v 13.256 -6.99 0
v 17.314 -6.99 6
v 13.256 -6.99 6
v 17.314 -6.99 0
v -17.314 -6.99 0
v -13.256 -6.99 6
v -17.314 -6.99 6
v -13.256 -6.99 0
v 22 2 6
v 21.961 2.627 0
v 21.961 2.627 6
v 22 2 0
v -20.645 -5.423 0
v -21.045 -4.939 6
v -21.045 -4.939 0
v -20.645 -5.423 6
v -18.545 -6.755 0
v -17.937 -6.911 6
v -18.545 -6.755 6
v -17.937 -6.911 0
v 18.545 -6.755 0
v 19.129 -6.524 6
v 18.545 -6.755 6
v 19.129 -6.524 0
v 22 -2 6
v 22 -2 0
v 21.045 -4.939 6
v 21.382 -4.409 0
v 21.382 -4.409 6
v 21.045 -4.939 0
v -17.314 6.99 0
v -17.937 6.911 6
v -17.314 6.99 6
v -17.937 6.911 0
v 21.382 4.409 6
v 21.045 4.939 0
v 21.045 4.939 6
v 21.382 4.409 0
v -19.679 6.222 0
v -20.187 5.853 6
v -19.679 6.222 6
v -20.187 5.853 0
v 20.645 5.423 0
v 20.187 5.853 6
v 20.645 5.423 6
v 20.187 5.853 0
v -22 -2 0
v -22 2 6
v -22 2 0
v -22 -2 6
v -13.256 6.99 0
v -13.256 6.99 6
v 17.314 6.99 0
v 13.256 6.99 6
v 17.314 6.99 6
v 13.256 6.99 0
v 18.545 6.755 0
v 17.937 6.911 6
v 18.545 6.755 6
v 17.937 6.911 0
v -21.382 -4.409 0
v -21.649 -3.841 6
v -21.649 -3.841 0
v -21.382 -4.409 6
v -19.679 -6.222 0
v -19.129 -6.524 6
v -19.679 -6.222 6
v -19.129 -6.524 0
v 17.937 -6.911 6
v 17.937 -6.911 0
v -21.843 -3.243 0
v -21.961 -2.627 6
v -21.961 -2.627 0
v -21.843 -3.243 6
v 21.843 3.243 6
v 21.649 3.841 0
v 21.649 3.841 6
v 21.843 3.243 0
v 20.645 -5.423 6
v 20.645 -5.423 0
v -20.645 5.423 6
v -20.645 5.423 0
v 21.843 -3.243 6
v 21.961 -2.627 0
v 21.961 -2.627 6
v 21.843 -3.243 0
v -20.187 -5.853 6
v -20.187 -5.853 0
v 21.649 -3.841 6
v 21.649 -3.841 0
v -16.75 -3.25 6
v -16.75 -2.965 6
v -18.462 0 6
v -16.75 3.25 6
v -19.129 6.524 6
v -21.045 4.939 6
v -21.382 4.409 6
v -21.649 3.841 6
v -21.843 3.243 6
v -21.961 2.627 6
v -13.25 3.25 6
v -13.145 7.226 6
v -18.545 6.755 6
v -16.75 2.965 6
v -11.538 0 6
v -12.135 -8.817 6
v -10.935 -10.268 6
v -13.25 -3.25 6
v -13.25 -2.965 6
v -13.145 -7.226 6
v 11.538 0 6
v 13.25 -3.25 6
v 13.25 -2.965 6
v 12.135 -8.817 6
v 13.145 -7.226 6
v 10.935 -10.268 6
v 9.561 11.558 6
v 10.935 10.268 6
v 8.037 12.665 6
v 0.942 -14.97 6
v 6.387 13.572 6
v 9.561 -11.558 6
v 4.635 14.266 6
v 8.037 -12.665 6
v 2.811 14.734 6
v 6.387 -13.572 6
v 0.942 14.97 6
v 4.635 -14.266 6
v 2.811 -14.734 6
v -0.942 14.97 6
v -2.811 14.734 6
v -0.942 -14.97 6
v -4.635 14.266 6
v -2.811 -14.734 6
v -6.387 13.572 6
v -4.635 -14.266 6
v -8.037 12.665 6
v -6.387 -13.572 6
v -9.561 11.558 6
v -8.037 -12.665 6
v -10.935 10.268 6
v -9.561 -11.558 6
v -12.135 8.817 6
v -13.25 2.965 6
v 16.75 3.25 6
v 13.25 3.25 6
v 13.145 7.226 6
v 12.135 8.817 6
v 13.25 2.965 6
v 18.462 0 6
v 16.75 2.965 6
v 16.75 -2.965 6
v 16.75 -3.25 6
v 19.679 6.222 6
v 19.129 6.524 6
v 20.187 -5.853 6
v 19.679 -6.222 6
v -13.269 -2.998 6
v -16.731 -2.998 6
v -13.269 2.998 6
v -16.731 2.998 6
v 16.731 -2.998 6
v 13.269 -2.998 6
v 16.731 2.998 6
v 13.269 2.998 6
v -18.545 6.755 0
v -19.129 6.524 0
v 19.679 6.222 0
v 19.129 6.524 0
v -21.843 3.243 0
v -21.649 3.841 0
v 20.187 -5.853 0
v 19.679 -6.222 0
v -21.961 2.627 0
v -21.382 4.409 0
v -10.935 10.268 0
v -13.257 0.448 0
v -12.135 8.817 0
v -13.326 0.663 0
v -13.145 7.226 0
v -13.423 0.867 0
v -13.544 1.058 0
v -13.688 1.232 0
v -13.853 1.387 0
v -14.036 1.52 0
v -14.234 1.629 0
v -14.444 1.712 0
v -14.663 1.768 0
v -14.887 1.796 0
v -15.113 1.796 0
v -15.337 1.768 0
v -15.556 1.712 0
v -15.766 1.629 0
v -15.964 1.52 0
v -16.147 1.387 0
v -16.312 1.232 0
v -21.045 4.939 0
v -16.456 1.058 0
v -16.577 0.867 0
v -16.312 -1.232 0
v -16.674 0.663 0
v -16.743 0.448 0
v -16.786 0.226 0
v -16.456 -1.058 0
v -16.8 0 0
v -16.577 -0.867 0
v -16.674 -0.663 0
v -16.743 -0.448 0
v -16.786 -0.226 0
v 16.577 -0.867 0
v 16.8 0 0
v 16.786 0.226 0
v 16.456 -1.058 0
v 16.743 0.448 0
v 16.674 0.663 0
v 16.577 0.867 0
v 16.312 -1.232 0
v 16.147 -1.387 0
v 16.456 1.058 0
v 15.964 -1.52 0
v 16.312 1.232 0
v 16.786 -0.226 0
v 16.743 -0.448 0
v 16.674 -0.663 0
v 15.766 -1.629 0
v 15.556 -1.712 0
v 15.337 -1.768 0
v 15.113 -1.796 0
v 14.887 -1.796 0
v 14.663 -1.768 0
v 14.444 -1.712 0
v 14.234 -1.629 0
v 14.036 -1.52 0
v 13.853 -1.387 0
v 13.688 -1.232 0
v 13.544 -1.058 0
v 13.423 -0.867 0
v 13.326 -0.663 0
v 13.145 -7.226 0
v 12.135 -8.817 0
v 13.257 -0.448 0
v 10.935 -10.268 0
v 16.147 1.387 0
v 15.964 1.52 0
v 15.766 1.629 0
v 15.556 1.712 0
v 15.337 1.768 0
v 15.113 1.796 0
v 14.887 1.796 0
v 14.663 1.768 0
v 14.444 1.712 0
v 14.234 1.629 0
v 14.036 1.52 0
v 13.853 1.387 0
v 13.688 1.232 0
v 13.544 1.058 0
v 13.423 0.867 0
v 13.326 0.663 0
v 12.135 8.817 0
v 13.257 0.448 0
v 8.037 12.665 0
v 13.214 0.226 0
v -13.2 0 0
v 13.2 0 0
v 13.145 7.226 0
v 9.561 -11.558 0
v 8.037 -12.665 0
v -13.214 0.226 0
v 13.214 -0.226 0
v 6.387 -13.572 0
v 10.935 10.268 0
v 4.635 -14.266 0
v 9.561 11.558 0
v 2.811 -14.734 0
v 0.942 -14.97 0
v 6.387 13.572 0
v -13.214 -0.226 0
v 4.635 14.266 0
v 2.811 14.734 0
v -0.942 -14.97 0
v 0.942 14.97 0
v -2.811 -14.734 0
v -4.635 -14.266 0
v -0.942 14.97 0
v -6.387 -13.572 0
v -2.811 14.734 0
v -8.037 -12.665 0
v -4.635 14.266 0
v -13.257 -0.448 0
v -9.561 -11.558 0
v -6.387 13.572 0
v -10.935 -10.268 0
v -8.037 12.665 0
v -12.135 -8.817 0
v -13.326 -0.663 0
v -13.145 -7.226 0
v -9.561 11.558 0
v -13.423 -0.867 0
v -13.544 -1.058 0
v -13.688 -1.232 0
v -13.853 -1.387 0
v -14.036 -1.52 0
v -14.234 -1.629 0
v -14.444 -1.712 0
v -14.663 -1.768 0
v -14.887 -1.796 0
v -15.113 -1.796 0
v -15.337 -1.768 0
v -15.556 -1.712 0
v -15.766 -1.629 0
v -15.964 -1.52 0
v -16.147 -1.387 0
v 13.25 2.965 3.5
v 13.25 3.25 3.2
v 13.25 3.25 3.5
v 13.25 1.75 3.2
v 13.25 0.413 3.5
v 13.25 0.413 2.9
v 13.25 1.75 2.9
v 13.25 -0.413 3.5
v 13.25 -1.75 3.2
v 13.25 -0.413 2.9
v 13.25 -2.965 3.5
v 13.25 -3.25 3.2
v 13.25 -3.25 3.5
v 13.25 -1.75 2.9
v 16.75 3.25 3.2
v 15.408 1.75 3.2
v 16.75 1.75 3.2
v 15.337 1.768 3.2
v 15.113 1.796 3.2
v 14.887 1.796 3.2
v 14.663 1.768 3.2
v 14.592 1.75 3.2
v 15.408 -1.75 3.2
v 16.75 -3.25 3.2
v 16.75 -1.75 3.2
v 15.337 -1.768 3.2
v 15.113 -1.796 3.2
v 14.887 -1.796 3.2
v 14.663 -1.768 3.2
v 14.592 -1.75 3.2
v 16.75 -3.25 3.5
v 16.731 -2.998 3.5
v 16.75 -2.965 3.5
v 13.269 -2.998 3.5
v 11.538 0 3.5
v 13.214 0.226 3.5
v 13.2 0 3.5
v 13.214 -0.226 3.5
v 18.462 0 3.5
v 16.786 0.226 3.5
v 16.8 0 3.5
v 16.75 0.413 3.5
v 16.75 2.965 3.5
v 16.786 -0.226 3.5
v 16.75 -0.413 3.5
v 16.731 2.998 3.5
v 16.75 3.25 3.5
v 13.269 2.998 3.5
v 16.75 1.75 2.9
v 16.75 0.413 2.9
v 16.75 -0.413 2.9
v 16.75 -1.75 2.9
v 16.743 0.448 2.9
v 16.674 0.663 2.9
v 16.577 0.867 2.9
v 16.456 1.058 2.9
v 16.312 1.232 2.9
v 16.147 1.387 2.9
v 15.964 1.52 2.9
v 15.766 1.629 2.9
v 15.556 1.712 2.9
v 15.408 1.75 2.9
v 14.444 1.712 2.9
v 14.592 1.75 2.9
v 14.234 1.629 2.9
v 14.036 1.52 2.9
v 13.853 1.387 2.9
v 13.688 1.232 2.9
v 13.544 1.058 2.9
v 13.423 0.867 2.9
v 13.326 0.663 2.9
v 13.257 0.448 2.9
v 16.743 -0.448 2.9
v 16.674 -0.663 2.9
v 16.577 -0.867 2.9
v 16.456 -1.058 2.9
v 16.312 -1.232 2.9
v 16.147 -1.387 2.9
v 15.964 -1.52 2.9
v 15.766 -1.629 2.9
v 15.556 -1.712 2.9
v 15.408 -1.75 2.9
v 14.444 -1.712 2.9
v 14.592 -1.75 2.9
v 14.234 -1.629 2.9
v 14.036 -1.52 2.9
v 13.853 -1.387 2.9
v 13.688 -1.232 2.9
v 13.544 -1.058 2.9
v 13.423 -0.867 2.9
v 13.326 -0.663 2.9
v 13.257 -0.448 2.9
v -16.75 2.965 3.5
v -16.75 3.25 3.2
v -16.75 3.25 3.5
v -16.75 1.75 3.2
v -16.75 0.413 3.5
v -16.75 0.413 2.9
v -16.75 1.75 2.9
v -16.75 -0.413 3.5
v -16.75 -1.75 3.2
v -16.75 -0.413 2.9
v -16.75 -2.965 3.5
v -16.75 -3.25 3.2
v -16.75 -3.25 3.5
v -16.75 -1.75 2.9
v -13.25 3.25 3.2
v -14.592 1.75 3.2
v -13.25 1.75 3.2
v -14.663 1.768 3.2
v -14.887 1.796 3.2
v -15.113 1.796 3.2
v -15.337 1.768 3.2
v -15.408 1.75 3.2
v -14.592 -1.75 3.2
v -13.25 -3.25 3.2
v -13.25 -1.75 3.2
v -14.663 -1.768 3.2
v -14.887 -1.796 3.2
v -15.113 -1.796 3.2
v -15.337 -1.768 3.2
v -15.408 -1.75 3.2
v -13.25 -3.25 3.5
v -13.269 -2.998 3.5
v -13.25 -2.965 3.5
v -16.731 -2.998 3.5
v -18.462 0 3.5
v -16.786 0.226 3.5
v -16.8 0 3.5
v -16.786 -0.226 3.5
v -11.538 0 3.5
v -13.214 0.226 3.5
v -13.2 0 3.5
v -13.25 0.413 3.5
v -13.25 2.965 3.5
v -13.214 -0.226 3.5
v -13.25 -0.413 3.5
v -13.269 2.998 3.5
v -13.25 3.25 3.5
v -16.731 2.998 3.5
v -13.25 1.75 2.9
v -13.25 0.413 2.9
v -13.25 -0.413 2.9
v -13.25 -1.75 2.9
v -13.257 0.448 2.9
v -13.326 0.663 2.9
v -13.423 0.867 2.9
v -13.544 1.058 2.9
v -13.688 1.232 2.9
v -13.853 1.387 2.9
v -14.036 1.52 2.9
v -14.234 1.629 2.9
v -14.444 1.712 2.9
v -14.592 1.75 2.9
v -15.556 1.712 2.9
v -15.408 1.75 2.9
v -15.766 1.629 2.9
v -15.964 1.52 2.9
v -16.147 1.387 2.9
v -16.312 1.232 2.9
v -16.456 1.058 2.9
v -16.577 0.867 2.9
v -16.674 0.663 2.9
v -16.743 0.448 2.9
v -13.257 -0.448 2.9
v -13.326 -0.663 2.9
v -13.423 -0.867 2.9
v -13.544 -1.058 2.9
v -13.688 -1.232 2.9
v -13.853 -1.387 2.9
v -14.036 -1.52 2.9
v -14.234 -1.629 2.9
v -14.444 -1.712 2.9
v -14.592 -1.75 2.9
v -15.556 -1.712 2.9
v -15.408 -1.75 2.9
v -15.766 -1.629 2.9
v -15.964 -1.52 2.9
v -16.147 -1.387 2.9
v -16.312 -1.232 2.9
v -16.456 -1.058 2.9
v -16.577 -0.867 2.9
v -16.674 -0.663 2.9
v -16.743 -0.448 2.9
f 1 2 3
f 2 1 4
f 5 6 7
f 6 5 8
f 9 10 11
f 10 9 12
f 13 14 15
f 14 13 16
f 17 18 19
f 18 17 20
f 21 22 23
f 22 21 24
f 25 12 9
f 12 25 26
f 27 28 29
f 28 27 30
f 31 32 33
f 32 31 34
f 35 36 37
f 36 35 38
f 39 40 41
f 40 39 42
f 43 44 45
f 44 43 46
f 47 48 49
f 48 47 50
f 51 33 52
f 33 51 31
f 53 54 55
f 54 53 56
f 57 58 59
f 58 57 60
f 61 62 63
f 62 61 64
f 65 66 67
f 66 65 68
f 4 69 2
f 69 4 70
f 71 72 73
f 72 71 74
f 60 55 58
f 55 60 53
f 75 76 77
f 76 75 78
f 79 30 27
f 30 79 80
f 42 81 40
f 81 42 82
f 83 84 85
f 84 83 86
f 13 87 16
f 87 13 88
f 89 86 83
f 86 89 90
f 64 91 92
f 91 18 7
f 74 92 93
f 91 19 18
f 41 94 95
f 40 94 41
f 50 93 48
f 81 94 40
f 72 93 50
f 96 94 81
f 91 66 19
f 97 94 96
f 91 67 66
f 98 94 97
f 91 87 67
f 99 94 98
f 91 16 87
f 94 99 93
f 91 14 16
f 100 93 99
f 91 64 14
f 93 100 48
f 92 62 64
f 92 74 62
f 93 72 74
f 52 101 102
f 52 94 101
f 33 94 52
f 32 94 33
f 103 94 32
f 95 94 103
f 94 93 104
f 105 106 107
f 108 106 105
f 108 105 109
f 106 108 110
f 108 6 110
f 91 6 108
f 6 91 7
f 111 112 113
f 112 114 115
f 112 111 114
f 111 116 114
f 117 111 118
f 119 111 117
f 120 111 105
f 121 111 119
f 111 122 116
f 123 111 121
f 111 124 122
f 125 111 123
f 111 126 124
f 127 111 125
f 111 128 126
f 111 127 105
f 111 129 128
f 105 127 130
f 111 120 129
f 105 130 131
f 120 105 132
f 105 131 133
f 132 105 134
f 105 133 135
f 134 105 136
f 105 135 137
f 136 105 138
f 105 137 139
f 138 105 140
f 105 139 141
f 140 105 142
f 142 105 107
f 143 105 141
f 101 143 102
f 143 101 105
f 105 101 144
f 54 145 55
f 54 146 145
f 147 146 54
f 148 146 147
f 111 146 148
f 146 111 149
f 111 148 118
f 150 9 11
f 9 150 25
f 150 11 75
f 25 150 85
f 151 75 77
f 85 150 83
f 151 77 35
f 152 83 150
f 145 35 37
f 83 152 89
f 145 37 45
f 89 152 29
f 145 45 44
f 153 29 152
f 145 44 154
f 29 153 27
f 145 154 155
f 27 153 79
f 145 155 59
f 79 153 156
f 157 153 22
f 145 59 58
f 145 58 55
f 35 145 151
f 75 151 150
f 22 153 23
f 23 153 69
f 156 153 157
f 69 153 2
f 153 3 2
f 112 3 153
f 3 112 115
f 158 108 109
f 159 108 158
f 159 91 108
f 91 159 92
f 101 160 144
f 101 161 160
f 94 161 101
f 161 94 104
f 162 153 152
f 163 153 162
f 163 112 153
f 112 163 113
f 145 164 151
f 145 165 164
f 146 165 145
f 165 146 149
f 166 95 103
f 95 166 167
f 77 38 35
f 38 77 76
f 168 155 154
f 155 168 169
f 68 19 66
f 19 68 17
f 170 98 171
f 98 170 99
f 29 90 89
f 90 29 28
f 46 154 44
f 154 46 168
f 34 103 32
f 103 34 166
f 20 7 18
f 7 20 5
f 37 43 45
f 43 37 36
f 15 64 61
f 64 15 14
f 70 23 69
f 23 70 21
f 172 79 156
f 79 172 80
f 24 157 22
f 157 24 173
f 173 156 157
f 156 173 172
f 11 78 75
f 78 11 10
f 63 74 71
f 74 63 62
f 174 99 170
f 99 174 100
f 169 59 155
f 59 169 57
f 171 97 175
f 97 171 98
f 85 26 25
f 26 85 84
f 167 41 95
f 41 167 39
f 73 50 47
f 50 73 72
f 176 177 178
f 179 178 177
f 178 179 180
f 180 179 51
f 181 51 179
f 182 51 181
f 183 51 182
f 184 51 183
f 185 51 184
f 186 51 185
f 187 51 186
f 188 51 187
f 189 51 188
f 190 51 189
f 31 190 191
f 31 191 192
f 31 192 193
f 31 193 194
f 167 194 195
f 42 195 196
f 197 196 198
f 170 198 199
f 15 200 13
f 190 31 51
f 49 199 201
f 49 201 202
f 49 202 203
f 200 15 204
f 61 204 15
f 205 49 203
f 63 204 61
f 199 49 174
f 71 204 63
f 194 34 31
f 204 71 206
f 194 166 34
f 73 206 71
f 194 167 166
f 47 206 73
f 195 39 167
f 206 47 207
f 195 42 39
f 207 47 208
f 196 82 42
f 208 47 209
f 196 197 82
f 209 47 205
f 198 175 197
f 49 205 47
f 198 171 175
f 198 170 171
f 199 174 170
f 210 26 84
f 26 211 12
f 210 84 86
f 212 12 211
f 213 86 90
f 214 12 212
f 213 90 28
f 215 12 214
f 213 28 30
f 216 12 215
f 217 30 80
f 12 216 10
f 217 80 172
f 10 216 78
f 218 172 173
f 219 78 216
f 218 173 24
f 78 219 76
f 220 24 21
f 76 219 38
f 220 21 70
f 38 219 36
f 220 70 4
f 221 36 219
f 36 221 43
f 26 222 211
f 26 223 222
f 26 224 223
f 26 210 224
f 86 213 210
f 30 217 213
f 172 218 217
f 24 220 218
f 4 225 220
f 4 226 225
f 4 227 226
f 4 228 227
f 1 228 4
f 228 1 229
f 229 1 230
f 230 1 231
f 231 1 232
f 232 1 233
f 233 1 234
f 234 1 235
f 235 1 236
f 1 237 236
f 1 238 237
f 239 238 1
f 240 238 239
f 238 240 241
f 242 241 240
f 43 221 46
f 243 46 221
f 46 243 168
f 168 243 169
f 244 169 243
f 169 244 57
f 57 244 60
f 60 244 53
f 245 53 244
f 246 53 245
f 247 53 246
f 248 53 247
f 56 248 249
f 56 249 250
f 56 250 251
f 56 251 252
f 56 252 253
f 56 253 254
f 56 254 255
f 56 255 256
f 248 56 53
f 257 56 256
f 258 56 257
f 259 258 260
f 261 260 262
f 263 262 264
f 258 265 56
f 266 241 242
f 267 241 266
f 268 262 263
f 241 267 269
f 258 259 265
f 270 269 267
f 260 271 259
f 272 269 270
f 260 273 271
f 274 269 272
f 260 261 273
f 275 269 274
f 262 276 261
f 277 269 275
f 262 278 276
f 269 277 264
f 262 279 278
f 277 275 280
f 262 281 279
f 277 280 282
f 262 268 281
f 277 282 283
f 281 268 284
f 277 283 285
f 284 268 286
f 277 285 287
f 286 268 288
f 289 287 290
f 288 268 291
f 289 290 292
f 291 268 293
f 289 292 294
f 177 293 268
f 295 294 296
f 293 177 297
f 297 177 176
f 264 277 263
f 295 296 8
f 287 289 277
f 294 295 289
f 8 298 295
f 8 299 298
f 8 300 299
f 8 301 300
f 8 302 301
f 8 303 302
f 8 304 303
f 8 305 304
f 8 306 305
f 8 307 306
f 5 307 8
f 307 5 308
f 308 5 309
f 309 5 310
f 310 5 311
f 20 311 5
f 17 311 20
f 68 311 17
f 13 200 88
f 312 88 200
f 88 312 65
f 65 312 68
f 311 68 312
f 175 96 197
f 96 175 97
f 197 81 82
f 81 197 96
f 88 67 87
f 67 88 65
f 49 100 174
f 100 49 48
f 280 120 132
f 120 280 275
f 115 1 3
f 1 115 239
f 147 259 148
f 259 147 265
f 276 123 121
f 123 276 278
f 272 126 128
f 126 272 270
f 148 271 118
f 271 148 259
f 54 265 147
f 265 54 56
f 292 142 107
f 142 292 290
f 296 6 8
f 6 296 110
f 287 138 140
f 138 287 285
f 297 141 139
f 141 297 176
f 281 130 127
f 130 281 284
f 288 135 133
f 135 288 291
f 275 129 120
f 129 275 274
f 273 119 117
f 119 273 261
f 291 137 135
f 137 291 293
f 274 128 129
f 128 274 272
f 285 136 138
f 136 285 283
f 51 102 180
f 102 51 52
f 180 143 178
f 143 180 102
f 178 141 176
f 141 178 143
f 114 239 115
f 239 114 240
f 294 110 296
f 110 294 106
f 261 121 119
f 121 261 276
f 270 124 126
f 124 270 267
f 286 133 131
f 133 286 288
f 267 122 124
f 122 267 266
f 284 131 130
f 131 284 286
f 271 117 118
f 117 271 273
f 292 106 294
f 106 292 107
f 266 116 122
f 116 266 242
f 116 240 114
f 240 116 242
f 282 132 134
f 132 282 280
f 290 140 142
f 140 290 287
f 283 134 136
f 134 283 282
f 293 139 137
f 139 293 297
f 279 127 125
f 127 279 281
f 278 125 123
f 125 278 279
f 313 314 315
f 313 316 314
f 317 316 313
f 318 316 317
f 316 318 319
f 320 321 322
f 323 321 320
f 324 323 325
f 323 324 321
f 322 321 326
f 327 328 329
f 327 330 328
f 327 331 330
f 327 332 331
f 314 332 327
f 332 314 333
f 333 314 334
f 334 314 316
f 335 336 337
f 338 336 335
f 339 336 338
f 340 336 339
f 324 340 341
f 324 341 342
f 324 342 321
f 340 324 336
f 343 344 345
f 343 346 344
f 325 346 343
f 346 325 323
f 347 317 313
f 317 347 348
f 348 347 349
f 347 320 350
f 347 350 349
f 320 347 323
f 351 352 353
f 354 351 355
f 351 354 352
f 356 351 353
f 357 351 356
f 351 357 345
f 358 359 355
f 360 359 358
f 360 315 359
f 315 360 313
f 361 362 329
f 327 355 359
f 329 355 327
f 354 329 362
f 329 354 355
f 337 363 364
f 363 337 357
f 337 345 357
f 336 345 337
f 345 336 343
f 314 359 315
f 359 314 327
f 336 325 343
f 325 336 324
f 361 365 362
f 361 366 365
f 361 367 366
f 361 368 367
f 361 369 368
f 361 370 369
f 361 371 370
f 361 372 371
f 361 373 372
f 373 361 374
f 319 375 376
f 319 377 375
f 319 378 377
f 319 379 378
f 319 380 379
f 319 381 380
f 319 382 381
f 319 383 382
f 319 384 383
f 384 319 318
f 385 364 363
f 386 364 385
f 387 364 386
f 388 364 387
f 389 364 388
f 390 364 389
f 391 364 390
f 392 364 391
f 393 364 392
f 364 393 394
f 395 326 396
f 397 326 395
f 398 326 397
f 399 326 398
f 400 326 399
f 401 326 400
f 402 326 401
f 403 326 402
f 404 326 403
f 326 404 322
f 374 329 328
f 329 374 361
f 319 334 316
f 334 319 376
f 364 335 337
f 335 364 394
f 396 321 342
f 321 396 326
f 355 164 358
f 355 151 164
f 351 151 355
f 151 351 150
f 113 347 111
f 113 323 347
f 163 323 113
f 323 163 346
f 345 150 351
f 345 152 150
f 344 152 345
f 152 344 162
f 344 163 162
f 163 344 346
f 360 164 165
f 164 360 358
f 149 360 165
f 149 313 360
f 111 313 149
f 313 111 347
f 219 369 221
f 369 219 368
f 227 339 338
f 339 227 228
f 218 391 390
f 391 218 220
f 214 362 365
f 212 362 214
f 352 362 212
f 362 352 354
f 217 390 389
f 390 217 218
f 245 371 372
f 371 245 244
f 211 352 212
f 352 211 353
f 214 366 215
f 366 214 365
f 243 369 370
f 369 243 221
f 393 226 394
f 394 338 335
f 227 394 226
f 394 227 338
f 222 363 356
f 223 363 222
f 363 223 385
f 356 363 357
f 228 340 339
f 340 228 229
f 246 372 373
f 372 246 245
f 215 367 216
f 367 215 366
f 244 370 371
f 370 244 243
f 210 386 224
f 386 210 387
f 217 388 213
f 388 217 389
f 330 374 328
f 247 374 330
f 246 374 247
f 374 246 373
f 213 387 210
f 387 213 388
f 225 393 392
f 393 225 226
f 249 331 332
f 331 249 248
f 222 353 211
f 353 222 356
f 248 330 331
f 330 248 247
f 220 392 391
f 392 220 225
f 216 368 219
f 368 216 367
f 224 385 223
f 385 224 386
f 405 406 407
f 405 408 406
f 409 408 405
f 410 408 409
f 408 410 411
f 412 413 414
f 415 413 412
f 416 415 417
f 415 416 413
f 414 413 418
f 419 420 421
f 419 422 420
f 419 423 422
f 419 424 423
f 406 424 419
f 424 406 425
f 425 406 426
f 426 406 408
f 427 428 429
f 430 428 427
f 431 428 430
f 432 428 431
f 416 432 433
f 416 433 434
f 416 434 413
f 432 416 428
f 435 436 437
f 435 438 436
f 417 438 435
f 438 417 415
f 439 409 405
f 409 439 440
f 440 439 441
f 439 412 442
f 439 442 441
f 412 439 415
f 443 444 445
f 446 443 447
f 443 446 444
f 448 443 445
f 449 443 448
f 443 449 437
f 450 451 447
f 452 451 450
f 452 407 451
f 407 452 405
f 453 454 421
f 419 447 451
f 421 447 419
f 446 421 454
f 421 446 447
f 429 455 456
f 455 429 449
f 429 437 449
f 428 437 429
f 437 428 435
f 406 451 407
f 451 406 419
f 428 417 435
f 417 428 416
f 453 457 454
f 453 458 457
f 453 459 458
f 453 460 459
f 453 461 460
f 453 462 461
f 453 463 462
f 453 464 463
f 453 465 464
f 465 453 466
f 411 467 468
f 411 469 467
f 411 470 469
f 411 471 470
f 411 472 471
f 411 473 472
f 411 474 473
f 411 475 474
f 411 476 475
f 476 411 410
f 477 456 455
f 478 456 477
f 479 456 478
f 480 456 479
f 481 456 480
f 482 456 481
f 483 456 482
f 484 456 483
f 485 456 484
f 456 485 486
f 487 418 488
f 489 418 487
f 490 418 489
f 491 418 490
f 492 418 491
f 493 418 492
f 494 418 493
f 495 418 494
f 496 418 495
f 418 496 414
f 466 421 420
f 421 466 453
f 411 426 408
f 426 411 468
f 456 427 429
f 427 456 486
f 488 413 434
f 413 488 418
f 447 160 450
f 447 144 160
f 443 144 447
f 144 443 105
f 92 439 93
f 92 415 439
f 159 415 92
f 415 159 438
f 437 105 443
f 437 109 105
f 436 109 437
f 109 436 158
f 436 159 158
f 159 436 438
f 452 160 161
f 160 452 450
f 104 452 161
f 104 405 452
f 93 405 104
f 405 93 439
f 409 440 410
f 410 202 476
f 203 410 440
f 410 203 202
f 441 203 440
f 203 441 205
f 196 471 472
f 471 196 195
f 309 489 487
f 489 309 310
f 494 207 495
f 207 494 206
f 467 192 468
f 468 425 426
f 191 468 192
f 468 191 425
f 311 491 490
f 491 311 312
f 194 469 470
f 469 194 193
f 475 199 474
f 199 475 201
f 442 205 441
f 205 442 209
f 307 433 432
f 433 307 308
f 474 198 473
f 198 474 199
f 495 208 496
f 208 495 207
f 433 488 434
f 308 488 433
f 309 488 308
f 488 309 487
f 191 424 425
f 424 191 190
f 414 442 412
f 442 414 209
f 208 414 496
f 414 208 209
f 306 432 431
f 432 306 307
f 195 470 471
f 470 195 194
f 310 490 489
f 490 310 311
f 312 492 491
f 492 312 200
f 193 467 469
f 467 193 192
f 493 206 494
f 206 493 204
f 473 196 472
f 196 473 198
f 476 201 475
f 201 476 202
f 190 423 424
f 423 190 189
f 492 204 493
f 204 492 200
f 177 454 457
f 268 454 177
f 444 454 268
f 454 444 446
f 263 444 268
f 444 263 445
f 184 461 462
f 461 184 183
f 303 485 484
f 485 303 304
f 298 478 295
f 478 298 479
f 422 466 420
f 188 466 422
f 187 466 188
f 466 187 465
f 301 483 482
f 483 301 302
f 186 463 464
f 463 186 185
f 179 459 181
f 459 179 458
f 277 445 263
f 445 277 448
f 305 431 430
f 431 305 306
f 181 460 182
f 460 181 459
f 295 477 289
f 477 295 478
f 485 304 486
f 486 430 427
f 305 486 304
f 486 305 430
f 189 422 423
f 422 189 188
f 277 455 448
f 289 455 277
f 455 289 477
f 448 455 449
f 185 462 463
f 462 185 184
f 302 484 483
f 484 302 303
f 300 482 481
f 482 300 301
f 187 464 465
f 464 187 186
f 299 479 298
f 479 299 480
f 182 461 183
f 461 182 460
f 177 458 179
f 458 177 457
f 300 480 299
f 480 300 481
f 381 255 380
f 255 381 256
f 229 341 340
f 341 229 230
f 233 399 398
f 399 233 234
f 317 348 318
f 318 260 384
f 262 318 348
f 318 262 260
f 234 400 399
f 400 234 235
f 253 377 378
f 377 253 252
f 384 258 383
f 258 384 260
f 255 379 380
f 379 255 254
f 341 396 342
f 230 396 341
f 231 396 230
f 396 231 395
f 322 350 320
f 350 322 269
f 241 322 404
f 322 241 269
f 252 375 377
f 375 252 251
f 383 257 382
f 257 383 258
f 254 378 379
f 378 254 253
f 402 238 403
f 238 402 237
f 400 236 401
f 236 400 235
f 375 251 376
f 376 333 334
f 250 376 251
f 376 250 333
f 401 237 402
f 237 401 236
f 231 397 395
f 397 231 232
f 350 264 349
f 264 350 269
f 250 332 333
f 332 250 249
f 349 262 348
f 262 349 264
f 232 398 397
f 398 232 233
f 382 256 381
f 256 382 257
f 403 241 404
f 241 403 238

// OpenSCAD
$fn = 50;


difference() {
	union() {
		hull() {
			translate(v = [-17.0000000000, 2.0000000000, 0]) {
				cylinder(h = 6, r = 5);
			}
			translate(v = [17.0000000000, 2.0000000000, 0]) {
				cylinder(h = 6, r = 5);
			}
			translate(v = [-17.0000000000, -2.0000000000, 0]) {
				cylinder(h = 6, r = 5);
			}
			translate(v = [17.0000000000, -2.0000000000, 0]) {
				cylinder(h = 6, r = 5);
			}
		}
		cylinder(h = 6, r = 15);
	}
	union() {
		translate(v = [15.0000000000, 0, -20]) {
			rotate(a = [0, 180, 0]) {
				difference() {
					union() {
						translate(v = [0, 0, -26.0000000000]) {
							rotate(a = [0, 0, 0]) {
								difference() {
									union() {
										#translate(v = [-1.7500000000, -3.2500000000, -0.3000000000]) {
											cube(size = [3.5000000000, 6.5000000000, 0.3000000000]);
										}
										#translate(v = [-1.7500000000, -1.7500000000, -0.6000000000]) {
											cube(size = [3.5000000000, 3.5000000000, 0.3000000000]);
										}
										#translate(v = [-1.7500000000, -3.2500000000, 2.5000000000]) {
											cube(size = [3.5000000000, 6.5000000000, 0.3000000000]);
										}
										#translate(v = [-1.7500000000, -1.7500000000, 2.8000000000]) {
											cube(size = [3.5000000000, 3.5000000000, 0.3000000000]);
										}
										#linear_extrude(height = 2.5000000000) {
											polygon(points = [[3.4620000000, 0.0000000000], [1.7310000000, 2.9981799479], [-1.7310000000, 2.9981799479], [-3.4620000000, 0.0000000000], [-1.7310000000, -2.9981799479], [1.7310000000, -2.9981799479]]);
										}
										#translate(v = [-1.7500000000, -3.2500000000, -0.3000000000]) {
											cube(size = [3.5000000000, 6.5000000000, 0.3000000000]);
										}
										#translate(v = [-1.7500000000, -1.7500000000, -0.6000000000]) {
											cube(size = [3.5000000000, 3.5000000000, 0.3000000000]);
										}
										#translate(v = [-1.7500000000, -3.2500000000, 2.5000000000]) {
											cube(size = [3.5000000000, 6.5000000000, 0.3000000000]);
										}
										#translate(v = [-1.7500000000, -1.7500000000, 2.8000000000]) {
											cube(size = [3.5000000000, 3.5000000000, 0.3000000000]);
										}
										#translate(v = [-1.7500000000, -3.2500000000, -0.3000000000]) {
											cube(size = [3.5000000000, 6.5000000000, 0.3000000000]);
										}
										#translate(v = [-1.7500000000, -1.7500000000, -0.6000000000]) {
											cube(size = [3.5000000000, 3.5000000000, 0.3000000000]);
										}
										#translate(v = [-1.7500000000, -3.2500000000, 2.5000000000]) {
											cube(size = [3.5000000000, 6.5000000000, 0.3000000000]);
										}
										#translate(v = [-1.7500000000, -1.7500000000, 2.8000000000]) {
											cube(size = [3.5000000000, 3.5000000000, 0.3000000000]);
										}
									}
									union();
								}
							}
						}
						translate(v = [0, 0, -26.0000000000]) {
							rotate(a = [0, 0, 0]) {
								difference() {
									union() {
										#translate(v = [-1.7500000000, -3.2500000000, -0.3000000000]) {
											cube(size = [3.5000000000, 6.5000000000, 0.3000000000]);
										}
										#translate(v = [-1.7500000000, -1.7500000000, -0.6000000000]) {
											cube(size = [3.5000000000, 3.5000000000, 0.3000000000]);
										}
										#translate(v = [-1.7500000000, -3.2500000000, 2.5000000000]) {
											cube(size = [3.5000000000, 6.5000000000, 0.3000000000]);
										}
										#translate(v = [-1.7500000000, -1.7500000000, 2.8000000000]) {
											cube(size = [3.5000000000, 3.5000000000, 0.3000000000]);
										}
										#linear_extrude(height = 2.5000000000) {
											polygon(points = [[3.4620000000, 0.0000000000], [1.7310000000, 2.9981799479], [-1.7310000000, 2.9981799479], [-3.4620000000, 0.0000000000], [-1.7310000000, -2.9981799479], [1.7310000000, -2.9981799479]]);
										}
										#translate(v = [-1.7500000000, -3.2500000000, -0.3000000000]) {
											cube(size = [3.5000000000, 6.5000000000, 0.3000000000]);
										}
										#translate(v = [-1.7500000000, -1.7500000000, -0.6000000000]) {
											cube(size = [3.5000000000, 3.5000000000, 0.3000000000]);
										}
										#translate(v = [-1.7500000000, -3.2500000000, 2.5000000000]) {
											cube(size = [3.5000000000, 6.5000000000, 0.3000000000]);
										}
										#translate(v = [-1.7500000000, -1.7500000000, 2.8000000000]) {
											cube(size = [3.5000000000, 3.5000000000, 0.3000000000]);
										}
										#translate(v = [-1.7500000000, -3.2500000000, -0.3000000000]) {
											cube(size = [3.5000000000, 6.5000000000, 0.3000000000]);
										}
										#translate(v = [-1.7500000000, -1.7500000000, -0.6000000000]) {
											cube(size = [3.5000000000, 3.5000000000, 0.3000000000]);
										}
										#translate(v = [-1.7500000000, -3.2500000000, 2.5000000000]) {
											cube(size = [3.5000000000, 6.5000000000, 0.3000000000]);
										}
										#translate(v = [-1.7500000000, -1.7500000000, 2.8000000000]) {
											cube(size = [3.5000000000, 3.5000000000, 0.3000000000]);
										}
									}
									union();
								}
							}
						}
						translate(v = [0, 0, -26.0000000000]) {
							rotate(a = [0, 0, 0]) {
								difference() {
									union() {
										#translate(v = [-1.7500000000, -3.2500000000, -0.3000000000]) {
											cube(size = [3.5000000000, 6.5000000000, 0.3000000000]);
										}
										#translate(v = [-1.7500000000, -1.7500000000, -0.6000000000]) {
											cube(size = [3.5000000000, 3.5000000000, 0.3000000000]);
										}
										#translate(v = [-1.7500000000, -3.2500000000, 2.5000000000]) {
											cube(size = [3.5000000000, 6.5000000000, 0.3000000000]);
										}
										#translate(v = [-1.7500000000, -1.7500000000, 2.8000000000]) {
											cube(size = [3.5000000000, 3.5000000000, 0.3000000000]);
										}
										#linear_extrude(height = 2.5000000000) {
											polygon(points = [[3.4620000000, 0.0000000000], [1.7310000000, 2.9981799479], [-1.7310000000, 2.9981799479], [-3.4620000000, 0.0000000000], [-1.7310000000, -2.9981799479], [1.7310000000, -2.9981799479]]);
										}
										#translate(v = [-1.7500000000, -3.2500000000, -0.3000000000]) {
											cube(size = [3.5000000000, 6.5000000000, 0.3000000000]);
										}
										#translate(v = [-1.7500000000, -1.7500000000, -0.6000000000]) {
											cube(size = [3.5000000000, 3.5000000000, 0.3000000000]);
										}
										#translate(v = [-1.7500000000, -3.2500000000, 2.5000000000]) {
											cube(size = [3.5000000000, 6.5000000000, 0.3000000000]);
										}
										#translate(v = [-1.7500000000, -1.7500000000, 2.8000000000]) {
											cube(size = [3.5000000000, 3.5000000000, 0.3000000000]);
										}
										#translate(v = [-1.7500000000, -3.2500000000, -0.3000000000]) {
											cube(size = [3.5000000000, 6.5000000000, 0.3000000000]);
										}
										#translate(v = [-1.7500000000, -1.7500000000, -0.6000000000]) {
											cube(size = [3.5000000000, 3.5000000000, 0.3000000000]);
										}
										#translate(v = [-1.7500000000, -3.2500000000, 2.5000000000]) {
											cube(size = [3.5000000000, 6.5000000000, 0.3000000000]);
										}
										#translate(v = [-1.7500000000, -1.7500000000, 2.8000000000]) {
											cube(size = [3.5000000000, 3.5000000000, 0.3000000000]);
										}
									}
									union();
								}
							}
						}
						#translate(v = [0, 0, -26.0000000000]) {
							cylinder(h = 26, r = 1.5000000000);
						}
						#translate(v = [0, 0, -1.9000000000]) {
							cylinder(h = 1.9000000000, r1 = 1.8000000000, r2 = 3.6000000000);
						}
						#translate(v = [0, 0, -26.0000000000]) {
							cylinder(h = 26, r = 1.8000000000);
						}
						#translate(v = [0, 0, -26.0000000000]) {
							cylinder(h = 26, r = 1.5000000000);
						}
					}
					union();
				}
			}
		}
		translate(v = [-15.0000000000, 0, -20]) {
			rotate(a = [0, 180, 0]) {
				difference() {
					union() {
						translate(v = [0, 0, -26.0000000000]) {
							rotate(a = [0, 0, 0]) {
								difference() {
									union() {
										#translate(v = [-1.7500000000, -3.2500000000, -0.3000000000]) {
											cube(size = [3.5000000000, 6.5000000000, 0.3000000000]);
										}
										#translate(v = [-1.7500000000, -1.7500000000, -0.6000000000]) {
											cube(size = [3.5000000000, 3.5000000000, 0.3000000000]);
										}
										#translate(v = [-1.7500000000, -3.2500000000, 2.5000000000]) {
											cube(size = [3.5000000000, 6.5000000000, 0.3000000000]);
										}
										#translate(v = [-1.7500000000, -1.7500000000, 2.8000000000]) {
											cube(size = [3.5000000000, 3.5000000000, 0.3000000000]);
										}
										#linear_extrude(height = 2.5000000000) {
											polygon(points = [[3.4620000000, 0.0000000000], [1.7310000000, 2.9981799479], [-1.7310000000, 2.9981799479], [-3.4620000000, 0.0000000000], [-1.7310000000, -2.9981799479], [1.7310000000, -2.9981799479]]);
										}
										#translate(v = [-1.7500000000, -3.2500000000, -0.3000000000]) {
											cube(size = [3.5000000000, 6.5000000000, 0.3000000000]);
										}
										#translate(v = [-1.7500000000, -1.7500000000, -0.6000000000]) {
											cube(size = [3.5000000000, 3.5000000000, 0.3000000000]);
										}
										#translate(v = [-1.7500000000, -3.2500000000, 2.5000000000]) {
											cube(size = [3.5000000000, 6.5000000000, 0.3000000000]);
										}
										#translate(v = [-1.7500000000, -1.7500000000, 2.8000000000]) {
											cube(size = [3.5000000000, 3.5000000000, 0.3000000000]);
										}
										#translate(v = [-1.7500000000, -3.2500000000, -0.3000000000]) {
											cube(size = [3.5000000000, 6.5000000000, 0.3000000000]);
										}
										#translate(v = [-1.7500000000, -1.7500000000, -0.6000000000]) {
											cube(size = [3.5000000000, 3.5000000000, 0.3000000000]);
										}
										#translate(v = [-1.7500000000, -3.2500000000, 2.5000000000]) {
											cube(size = [3.5000000000, 6.5000000000, 0.3000000000]);
										}
										#translate(v = [-1.7500000000, -1.7500000000, 2.8000000000]) {
											cube(size = [3.5000000000, 3.5000000000, 0.3000000000]);
										}
									}
									union();
								}
							}
						}
						translate(v = [0, 0, -26.0000000000]) {
							rotate(a = [0, 0, 0]) {
								difference() {
									union() {
										#translate(v = [-1.7500000000, -3.2500000000, -0.3000000000]) {
											cube(size = [3.5000000000, 6.5000000000, 0.3000000000]);
										}
										#translate(v = [-1.7500000000, -1.7500000000, -0.6000000000]) {
											cube(size = [3.5000000000, 3.5000000000, 0.3000000000]);
										}
										#translate(v = [-1.7500000000, -3.2500000000, 2.5000000000]) {
											cube(size = [3.5000000000, 6.5000000000, 0.3000000000]);
										}
										#translate(v = [-1.7500000000, -1.7500000000, 2.8000000000]) {
											cube(size = [3.5000000000, 3.5000000000, 0.3000000000]);
										}
										#linear_extrude(height = 2.5000000000) {
											polygon(points = [[3.4620000000, 0.0000000000], [1.7310000000, 2.9981799479], [-1.7310000000, 2.9981799479], [-3.4620000000, 0.0000000000], [-1.7310000000, -2.9981799479], [1.7310000000, -2.9981799479]]);
										}
										#translate(v = [-1.7500000000, -3.2500000000, -0.3000000000]) {
											cube(size = [3.5000000000, 6.5000000000, 0.3000000000]);
										}
										#translate(v = [-1.7500000000, -1.7500000000, -0.6000000000]) {
											cube(size = [3.5000000000, 3.5000000000, 0.3000000000]);
										}
										#translate(v = [-1.7500000000, -3.2500000000, 2.5000000000]) {
											cube(size = [3.5000000000, 6.5000000000, 0.3000000000]);
										}
										#translate(v = [-1.7500000000, -1.7500000000, 2.8000000000]) {
											cube(size = [3.5000000000, 3.5000000000, 0.3000000000]);
										}
										#translate(v = [-1.7500000000, -3.2500000000, -0.3000000000]) {
											cube(size = [3.5000000000, 6.5000000000, 0.3000000000]);
										}
										#translate(v = [-1.7500000000, -1.7500000000, -0.6000000000]) {
											cube(size = [3.5000000000, 3.5000000000, 0.3000000000]);
										}
										#translate(v = [-1.7500000000, -3.2500000000, 2.5000000000]) {
											cube(size = [3.5000000000, 6.5000000000, 0.3000000000]);
										}
										#translate(v = [-1.7500000000, -1.7500000000, 2.8000000000]) {
											cube(size = [3.5000000000, 3.5000000000, 0.3000000000]);
										}
									}
									union();
								}
							}
						}
						translate(v = [0, 0, -26.0000000000]) {
							rotate(a = [0, 0, 0]) {
								difference() {
									union() {
										#translate(v = [-1.7500000000, -3.2500000000, -0.3000000000]) {
											cube(size = [3.5000000000, 6.5000000000, 0.3000000000]);
										}
										#translate(v = [-1.7500000000, -1.7500000000, -0.6000000000]) {
											cube(size = [3.5000000000, 3.5000000000, 0.3000000000]);
										}
										#translate(v = [-1.7500000000, -3.2500000000, 2.5000000000]) {
											cube(size = [3.5000000000, 6.5000000000, 0.3000000000]);
										}
										#translate(v = [-1.7500000000, -1.7500000000, 2.8000000000]) {
											cube(size = [3.5000000000, 3.5000000000, 0.3000000000]);
										}
										#linear_extrude(height = 2.5000000000) {
											polygon(points = [[3.4620000000, 0.0000000000], [1.7310000000, 2.9981799479], [-1.7310000000, 2.9981799479], [-3.4620000000, 0.0000000000], [-1.7310000000, -2.9981799479], [1.7310000000, -2.9981799479]]);
										}
										#translate(v = [-1.7500000000, -3.2500000000, -0.3000000000]) {
											cube(size = [3.5000000000, 6.5000000000, 0.3000000000]);
										}
										#translate(v = [-1.7500000000, -1.7500000000, -0.6000000000]) {
											cube(size = [3.5000000000, 3.5000000000, 0.3000000000]);
										}
										#translate(v = [-1.7500000000, -3.2500000000, 2.5000000000]) {
											cube(size = [3.5000000000, 6.5000000000, 0.3000000000]);
										}
										#translate(v = [-1.7500000000, -1.7500000000, 2.8000000000]) {
											cube(size = [3.5000000000, 3.5000000000, 0.3000000000]);
										}
										#translate(v = [-1.7500000000, -3.2500000000, -0.3000000000]) {
											cube(size = [3.5000000000, 6.5000000000, 0.3000000000]);
										}
										#translate(v = [-1.7500000000, -1.7500000000, -0.6000000000]) {
											cube(size = [3.5000000000, 3.5000000000, 0.3000000000]);
										}
										#translate(v = [-1.7500000000, -3.2500000000, 2.5000000000]) {
											cube(size = [3.5000000000, 6.5000000000, 0.3000000000]);
										}
										#translate(v = [-1.7500000000, -1.7500000000, 2.8000000000]) {
											cube(size = [3.5000000000, 3.5000000000, 0.3000000000]);
										}
									}
									union();
								}
							}
						}
						#translate(v = [0, 0, -26.0000000000]) {
							cylinder(h = 26, r = 1.5000000000);
						}
						#translate(v = [0, 0, -1.9000000000]) {
							cylinder(h = 1.9000000000, r1 = 1.8000000000, r2 = 3.6000000000);
						}
						#translate(v = [0, 0, -26.0000000000]) {
							cylinder(h = 26, r = 1.8000000000);
						}
						#translate(v = [0, 0, -26.0000000000]) {
							cylinder(h = 26, r = 1.5000000000);
						}
					}
					union();
				}
			}
		}
		translate(v = [-15.0000000000, 0.0000000000, 0]) {
			cylinder(h = 6, r = 1.8000000000);
		}
		translate(v = [15.0000000000, 0.0000000000, 0]) {
			cylinder(h = 6, r = 1.8000000000);
		}
		translate(v = [-15.0000000000, 0.0000000000, 0]) {
			cylinder(h = 6, r = 1.8000000000);
		}
		translate(v = [15.0000000000, 0.0000000000, 0]) {
			cylinder(h = 6, r = 1.8000000000);
		}
		translate(v = [-15.0000000000, 0.0000000000, 0]) {
			cylinder(h = 6, r = 1.8000000000);
		}
		translate(v = [15.0000000000, 0.0000000000, 0]) {
			cylinder(h = 6, r = 1.8000000000);
		}
		translate(v = [-15.0000000000, 0.0000000000, 0]) {
			cylinder(h = 6, r = 1.8000000000);
		}
		translate(v = [15.0000000000, 0.0000000000, 0]) {
			cylinder(h = 6, r = 1.8000000000);
		}
	}
}
